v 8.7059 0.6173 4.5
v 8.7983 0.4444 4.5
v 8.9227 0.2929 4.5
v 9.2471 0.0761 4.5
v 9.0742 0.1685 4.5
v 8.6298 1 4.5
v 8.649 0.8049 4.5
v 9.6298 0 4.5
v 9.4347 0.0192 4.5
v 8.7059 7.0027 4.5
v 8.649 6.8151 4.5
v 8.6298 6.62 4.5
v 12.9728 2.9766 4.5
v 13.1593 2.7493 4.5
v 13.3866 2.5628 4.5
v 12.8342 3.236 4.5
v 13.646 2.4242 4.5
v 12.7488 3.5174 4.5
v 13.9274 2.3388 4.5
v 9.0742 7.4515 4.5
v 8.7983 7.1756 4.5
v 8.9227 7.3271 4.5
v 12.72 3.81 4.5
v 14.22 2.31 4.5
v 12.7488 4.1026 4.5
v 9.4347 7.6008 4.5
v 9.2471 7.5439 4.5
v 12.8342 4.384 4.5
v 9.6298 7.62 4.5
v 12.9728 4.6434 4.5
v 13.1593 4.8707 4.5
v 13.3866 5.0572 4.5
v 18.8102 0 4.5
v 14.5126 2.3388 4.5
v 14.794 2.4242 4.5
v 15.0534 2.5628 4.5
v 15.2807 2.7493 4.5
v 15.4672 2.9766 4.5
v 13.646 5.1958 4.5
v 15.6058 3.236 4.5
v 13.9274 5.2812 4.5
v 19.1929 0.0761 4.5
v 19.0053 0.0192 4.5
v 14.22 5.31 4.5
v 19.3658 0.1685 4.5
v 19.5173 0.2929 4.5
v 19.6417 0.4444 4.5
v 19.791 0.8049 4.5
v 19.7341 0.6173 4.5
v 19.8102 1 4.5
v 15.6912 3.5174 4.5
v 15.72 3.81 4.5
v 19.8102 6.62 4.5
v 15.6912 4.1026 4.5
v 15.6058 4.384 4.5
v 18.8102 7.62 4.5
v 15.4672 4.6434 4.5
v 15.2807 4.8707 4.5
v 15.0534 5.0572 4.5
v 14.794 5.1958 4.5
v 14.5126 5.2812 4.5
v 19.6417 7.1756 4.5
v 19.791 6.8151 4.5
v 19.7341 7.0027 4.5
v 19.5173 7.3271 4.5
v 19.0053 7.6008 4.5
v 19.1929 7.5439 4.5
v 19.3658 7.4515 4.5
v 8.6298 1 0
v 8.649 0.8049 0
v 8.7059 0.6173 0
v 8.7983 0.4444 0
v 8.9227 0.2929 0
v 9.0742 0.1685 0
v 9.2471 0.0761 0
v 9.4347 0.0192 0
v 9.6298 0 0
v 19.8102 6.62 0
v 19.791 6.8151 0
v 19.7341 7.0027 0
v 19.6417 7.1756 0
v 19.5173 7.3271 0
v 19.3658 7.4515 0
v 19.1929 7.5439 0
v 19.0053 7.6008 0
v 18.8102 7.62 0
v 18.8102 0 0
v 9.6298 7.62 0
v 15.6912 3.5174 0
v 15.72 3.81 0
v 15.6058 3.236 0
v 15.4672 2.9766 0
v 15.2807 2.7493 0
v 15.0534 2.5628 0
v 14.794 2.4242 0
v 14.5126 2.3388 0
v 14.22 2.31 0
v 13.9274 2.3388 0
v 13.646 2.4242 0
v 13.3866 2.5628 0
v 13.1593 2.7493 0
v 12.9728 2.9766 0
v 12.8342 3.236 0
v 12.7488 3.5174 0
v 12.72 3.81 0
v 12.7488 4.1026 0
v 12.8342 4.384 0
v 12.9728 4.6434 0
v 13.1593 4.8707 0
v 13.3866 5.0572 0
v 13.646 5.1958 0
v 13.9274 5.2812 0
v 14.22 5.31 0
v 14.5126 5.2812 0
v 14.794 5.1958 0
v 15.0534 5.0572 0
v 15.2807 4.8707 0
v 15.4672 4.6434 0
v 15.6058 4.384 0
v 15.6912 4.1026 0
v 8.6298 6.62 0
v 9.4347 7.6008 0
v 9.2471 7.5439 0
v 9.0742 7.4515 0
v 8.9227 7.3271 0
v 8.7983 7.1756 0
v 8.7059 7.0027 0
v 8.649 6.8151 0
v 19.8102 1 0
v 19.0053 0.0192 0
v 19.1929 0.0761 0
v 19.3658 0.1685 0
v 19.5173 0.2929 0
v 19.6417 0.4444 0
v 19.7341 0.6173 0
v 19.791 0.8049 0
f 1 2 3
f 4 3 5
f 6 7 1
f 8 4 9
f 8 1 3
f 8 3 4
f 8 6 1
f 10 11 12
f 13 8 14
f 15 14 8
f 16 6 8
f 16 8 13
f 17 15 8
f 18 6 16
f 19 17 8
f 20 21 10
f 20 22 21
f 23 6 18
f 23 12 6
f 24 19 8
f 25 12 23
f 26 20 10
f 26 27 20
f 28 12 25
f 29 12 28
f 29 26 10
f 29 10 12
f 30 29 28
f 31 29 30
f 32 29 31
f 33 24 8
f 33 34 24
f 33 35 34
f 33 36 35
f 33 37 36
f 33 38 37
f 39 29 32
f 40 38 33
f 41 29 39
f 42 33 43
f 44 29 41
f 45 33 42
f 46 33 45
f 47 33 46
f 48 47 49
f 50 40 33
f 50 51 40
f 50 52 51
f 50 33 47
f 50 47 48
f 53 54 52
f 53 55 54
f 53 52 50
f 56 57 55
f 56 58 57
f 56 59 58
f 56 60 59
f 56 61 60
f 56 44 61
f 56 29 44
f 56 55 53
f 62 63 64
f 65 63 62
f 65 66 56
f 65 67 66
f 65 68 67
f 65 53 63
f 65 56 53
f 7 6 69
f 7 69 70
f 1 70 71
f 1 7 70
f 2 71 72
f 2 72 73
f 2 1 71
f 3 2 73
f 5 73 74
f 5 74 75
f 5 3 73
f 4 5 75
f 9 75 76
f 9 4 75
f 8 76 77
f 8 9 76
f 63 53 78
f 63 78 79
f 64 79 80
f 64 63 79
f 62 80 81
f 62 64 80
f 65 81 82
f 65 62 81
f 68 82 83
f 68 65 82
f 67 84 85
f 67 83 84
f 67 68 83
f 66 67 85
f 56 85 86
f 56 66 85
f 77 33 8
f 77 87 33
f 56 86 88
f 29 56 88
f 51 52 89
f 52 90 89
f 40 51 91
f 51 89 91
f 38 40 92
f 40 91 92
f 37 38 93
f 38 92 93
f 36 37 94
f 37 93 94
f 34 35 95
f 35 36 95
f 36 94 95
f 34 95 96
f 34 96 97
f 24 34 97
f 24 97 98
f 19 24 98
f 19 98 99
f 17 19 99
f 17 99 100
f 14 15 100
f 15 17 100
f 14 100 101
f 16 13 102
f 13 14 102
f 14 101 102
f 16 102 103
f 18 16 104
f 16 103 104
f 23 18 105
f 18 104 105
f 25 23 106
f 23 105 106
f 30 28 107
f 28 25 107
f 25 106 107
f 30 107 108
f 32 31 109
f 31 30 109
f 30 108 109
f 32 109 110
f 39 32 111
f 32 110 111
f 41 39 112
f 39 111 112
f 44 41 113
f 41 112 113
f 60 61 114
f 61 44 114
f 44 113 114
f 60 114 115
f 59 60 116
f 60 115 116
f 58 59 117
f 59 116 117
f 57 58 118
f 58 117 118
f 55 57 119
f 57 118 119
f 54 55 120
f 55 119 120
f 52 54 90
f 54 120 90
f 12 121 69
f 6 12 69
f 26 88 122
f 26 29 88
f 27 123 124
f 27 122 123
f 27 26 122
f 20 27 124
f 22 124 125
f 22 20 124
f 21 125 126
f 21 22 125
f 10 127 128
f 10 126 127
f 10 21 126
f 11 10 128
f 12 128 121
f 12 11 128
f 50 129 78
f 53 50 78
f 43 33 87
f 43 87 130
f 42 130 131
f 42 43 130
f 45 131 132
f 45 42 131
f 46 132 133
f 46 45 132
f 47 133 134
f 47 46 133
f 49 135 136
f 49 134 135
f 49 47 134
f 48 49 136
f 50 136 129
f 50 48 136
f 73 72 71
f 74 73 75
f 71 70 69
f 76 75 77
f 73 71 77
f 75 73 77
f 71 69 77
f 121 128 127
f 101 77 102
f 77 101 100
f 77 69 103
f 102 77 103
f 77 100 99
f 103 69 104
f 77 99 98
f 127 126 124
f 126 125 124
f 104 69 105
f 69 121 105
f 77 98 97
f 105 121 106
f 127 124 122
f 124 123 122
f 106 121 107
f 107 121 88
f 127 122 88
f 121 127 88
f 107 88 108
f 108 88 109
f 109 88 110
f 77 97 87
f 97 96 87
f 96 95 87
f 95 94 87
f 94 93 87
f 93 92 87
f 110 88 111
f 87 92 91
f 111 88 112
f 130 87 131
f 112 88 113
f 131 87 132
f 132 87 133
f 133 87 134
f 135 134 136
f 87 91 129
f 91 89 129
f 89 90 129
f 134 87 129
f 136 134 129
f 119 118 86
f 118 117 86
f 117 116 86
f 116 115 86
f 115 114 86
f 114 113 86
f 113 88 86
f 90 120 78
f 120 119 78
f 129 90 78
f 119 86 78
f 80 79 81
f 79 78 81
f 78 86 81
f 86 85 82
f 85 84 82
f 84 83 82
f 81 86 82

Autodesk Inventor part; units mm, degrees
ref_plane "YZ Plane" through (0, 0, 0) normal (1, 0, 0) x (0, 1, 0)
ref_plane "XZ Plane" through (0, 0, 0) normal (0, 1, 0) x (-1, 0, 0)
ref_plane "XY Plane" through (0, 0, 0) normal (0, 0, 1) x (1, 0, 0)
sketch "Sketch1" plane through (0, 0, 0) normal (0, 0, 1) x (1, 0, 0)
  circle A0 centre (14.22, 3.81) radius 1.5 projected
  circle A1 centre (14.22, -4.69) radius 1.5 projected
  line L0 (8.6298, -8.5) -> (19.8102, -8.5) projected
  line L1 (19.8102, -8.5) -> (19.8102, 0) projected
  line L2 (19.8102, 0) -> (8.6298, 0) projected
  line L3 (8.6298, 0) -> (8.6298, -8.5) projected
  line L4 (8.6298, 0) -> (19.8102, 0)
  line L5 (19.8102, 0) -> (19.8102, 7.62)
  line L6 (19.8102, 7.62) -> (8.6298, 7.62)
  line L7 (8.6298, 7.62) -> (8.6298, 0)
  point P0 (0, 0)
  dimension "d0" = 3.81
extrude "Extrusion1" add sketch "Sketch1" along normal blind 4.5 contours L7 L6 L5 L2
fillet "Fillet1" radius 1 4 edges at (8.6298, 7.62, 2.25) (8.6298, 0, 2.25) (19.8102, 7.62, 2.25) (19.8102, 0, 2.25)
properties part number "ConnectingBlockTail"
